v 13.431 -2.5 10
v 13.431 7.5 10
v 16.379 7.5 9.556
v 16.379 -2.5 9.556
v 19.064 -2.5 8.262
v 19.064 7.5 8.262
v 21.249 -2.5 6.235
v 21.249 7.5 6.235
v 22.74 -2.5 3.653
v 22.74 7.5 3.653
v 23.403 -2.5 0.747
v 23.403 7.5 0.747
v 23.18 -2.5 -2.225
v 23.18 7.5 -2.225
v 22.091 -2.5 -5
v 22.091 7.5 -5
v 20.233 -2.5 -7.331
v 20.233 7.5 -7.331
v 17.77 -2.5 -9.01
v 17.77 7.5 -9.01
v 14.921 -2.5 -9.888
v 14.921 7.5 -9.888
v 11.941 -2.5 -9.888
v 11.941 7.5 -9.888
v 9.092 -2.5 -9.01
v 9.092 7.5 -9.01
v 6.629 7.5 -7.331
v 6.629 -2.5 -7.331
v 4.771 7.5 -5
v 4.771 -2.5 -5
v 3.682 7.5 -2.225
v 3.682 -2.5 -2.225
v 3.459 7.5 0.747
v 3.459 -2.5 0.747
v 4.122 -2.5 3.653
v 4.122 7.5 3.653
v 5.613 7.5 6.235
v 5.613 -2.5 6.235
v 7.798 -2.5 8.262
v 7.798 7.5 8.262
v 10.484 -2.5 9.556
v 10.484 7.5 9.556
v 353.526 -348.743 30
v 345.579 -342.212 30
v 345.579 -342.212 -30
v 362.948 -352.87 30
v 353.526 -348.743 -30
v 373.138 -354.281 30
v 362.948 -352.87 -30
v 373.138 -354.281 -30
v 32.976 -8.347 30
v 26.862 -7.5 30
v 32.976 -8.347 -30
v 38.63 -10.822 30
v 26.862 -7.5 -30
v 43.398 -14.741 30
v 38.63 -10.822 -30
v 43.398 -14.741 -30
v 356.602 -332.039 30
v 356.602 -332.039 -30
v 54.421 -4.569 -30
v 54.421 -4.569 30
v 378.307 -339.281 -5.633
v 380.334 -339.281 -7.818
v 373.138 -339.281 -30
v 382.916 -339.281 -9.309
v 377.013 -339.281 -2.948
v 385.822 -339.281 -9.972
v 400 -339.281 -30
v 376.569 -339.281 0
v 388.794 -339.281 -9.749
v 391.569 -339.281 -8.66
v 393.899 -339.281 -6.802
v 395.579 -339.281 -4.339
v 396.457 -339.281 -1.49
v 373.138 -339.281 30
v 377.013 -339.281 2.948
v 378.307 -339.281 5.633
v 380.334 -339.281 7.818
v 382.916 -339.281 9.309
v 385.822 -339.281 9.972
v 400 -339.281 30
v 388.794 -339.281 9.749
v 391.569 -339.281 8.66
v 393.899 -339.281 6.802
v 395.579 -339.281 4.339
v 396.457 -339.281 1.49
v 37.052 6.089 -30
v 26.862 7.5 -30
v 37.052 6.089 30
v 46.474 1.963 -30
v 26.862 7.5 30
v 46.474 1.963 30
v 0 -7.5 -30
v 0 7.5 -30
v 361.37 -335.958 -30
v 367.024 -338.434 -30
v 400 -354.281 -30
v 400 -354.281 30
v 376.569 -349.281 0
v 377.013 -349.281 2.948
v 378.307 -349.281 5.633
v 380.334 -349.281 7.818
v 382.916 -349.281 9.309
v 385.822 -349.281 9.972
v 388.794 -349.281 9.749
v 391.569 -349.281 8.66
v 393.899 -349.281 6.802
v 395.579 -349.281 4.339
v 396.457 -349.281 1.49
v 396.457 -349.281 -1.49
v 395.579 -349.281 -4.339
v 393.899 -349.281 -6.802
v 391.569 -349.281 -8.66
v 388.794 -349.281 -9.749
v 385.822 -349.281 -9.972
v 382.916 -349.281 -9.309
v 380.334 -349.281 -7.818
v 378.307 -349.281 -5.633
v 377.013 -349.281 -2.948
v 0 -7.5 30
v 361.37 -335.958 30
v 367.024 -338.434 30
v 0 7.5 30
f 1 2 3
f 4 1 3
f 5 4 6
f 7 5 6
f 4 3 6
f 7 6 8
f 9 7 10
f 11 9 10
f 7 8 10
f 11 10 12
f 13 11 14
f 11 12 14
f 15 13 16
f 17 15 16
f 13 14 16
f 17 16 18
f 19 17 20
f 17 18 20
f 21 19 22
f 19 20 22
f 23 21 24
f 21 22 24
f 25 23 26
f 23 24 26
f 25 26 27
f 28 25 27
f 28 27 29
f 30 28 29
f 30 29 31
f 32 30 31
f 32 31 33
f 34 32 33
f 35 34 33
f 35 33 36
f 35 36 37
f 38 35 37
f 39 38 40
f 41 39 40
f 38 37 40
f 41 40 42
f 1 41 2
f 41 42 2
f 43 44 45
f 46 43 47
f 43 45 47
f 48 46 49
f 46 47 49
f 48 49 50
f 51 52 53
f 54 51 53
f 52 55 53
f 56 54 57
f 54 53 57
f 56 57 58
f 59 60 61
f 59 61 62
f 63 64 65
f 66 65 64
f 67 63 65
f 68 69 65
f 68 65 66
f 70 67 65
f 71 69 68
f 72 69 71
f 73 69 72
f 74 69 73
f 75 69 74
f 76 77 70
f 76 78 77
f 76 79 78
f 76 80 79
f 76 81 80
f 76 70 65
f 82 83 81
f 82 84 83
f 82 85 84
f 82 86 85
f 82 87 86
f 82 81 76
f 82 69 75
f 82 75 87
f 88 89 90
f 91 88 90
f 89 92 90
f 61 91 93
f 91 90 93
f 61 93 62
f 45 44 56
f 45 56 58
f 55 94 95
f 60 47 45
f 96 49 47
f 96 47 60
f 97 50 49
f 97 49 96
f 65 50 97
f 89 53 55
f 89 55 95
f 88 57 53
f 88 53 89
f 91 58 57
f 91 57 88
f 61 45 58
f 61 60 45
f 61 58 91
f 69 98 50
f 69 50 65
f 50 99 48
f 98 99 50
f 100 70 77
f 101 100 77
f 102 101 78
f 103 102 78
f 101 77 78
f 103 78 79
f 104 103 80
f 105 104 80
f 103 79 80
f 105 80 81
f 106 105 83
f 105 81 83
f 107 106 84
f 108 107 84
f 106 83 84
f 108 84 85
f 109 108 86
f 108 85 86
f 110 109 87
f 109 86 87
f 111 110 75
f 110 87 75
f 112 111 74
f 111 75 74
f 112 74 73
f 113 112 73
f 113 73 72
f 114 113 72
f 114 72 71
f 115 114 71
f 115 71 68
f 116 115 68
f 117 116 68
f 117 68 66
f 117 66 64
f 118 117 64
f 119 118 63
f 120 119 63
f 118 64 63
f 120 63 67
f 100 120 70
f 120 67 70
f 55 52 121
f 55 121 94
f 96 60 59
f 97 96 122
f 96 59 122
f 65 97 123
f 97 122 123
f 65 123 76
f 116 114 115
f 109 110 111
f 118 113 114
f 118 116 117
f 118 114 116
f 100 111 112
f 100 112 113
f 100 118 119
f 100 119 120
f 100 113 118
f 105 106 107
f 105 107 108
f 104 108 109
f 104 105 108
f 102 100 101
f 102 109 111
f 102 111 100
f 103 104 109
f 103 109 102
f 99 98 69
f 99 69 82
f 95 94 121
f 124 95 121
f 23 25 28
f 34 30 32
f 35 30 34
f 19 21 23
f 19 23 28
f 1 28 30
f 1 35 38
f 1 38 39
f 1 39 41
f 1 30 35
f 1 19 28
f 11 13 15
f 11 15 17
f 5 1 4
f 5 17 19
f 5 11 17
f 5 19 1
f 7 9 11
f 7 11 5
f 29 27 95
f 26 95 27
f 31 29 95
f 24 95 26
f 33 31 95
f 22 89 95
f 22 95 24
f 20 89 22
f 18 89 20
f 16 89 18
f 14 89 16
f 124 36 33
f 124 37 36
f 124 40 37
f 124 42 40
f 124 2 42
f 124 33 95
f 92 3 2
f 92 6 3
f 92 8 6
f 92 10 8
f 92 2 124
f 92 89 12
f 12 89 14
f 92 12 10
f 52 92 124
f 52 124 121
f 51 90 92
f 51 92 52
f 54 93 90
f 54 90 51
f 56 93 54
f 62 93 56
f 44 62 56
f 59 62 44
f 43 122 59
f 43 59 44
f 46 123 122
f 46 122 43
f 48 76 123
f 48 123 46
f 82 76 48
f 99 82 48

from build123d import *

# Parameters (mm, degrees)
SKETCH_2_W          = 60
SKETCH_2_H          = 15
SKETCH_3_R          = 10
CUT_EXTRUDE_1_DEPTH = 10
SKETCH_4_R          = 10
CUT_EXTRUDE_2_DEPTH = 10


with BuildPart() as part:
    # 扫描1: sweep along a path in 草图1
    with BuildLine(Plane.XY) as sweep_1_path:
        Line((0, 0), (26.862133413, 0))
        ThreePointArc((26.862133413, 0), (38.896590134, -2.519609693), (48.909571267, -9.655209904))
        Line((48.909571267, -9.655209904), (351.090428733, -337.125468596))
        ThreePointArc((351.090428733, -337.125468596), (361.103409866, -344.261068807), (373.137866587, -346.7806785))
        Line((373.137866587, -346.7806785), (400, -346.7806785))
    # 草图2 → 扫描1 (sweep)
    with BuildSketch(Plane(origin=(0, 0, 0), x_dir=(0, 0, -1), z_dir=(1, 0, 0))):
        Rectangle(SKETCH_2_W, SKETCH_2_H)
    sweep(path=sweep_1_path.line)

    # 草图3 → 切除-拉伸1 (cut)
    with BuildSketch(Plane(origin=(0, 7.5, 0), x_dir=(1, 0, 0), z_dir=(0, 1, 0))):
        with Locations(Location((13.431066706, 0, 0), (0, 0, 270))):
            Circle(SKETCH_3_R)
    extrude(amount=-CUT_EXTRUDE_1_DEPTH, mode=Mode.SUBTRACT)

    # 草图4 → 切除-拉伸2 (cut)
    with BuildSketch(Plane(origin=(0, -339.2806785, 0), x_dir=(1, 0, 0), z_dir=(0, 1, 0))):
        with Locations(Location((386.568933294, 0, 0), (0, 0, 180))):
            Circle(SKETCH_4_R)
    extrude(amount=-CUT_EXTRUDE_2_DEPTH, mode=Mode.SUBTRACT)


solid = part.part
